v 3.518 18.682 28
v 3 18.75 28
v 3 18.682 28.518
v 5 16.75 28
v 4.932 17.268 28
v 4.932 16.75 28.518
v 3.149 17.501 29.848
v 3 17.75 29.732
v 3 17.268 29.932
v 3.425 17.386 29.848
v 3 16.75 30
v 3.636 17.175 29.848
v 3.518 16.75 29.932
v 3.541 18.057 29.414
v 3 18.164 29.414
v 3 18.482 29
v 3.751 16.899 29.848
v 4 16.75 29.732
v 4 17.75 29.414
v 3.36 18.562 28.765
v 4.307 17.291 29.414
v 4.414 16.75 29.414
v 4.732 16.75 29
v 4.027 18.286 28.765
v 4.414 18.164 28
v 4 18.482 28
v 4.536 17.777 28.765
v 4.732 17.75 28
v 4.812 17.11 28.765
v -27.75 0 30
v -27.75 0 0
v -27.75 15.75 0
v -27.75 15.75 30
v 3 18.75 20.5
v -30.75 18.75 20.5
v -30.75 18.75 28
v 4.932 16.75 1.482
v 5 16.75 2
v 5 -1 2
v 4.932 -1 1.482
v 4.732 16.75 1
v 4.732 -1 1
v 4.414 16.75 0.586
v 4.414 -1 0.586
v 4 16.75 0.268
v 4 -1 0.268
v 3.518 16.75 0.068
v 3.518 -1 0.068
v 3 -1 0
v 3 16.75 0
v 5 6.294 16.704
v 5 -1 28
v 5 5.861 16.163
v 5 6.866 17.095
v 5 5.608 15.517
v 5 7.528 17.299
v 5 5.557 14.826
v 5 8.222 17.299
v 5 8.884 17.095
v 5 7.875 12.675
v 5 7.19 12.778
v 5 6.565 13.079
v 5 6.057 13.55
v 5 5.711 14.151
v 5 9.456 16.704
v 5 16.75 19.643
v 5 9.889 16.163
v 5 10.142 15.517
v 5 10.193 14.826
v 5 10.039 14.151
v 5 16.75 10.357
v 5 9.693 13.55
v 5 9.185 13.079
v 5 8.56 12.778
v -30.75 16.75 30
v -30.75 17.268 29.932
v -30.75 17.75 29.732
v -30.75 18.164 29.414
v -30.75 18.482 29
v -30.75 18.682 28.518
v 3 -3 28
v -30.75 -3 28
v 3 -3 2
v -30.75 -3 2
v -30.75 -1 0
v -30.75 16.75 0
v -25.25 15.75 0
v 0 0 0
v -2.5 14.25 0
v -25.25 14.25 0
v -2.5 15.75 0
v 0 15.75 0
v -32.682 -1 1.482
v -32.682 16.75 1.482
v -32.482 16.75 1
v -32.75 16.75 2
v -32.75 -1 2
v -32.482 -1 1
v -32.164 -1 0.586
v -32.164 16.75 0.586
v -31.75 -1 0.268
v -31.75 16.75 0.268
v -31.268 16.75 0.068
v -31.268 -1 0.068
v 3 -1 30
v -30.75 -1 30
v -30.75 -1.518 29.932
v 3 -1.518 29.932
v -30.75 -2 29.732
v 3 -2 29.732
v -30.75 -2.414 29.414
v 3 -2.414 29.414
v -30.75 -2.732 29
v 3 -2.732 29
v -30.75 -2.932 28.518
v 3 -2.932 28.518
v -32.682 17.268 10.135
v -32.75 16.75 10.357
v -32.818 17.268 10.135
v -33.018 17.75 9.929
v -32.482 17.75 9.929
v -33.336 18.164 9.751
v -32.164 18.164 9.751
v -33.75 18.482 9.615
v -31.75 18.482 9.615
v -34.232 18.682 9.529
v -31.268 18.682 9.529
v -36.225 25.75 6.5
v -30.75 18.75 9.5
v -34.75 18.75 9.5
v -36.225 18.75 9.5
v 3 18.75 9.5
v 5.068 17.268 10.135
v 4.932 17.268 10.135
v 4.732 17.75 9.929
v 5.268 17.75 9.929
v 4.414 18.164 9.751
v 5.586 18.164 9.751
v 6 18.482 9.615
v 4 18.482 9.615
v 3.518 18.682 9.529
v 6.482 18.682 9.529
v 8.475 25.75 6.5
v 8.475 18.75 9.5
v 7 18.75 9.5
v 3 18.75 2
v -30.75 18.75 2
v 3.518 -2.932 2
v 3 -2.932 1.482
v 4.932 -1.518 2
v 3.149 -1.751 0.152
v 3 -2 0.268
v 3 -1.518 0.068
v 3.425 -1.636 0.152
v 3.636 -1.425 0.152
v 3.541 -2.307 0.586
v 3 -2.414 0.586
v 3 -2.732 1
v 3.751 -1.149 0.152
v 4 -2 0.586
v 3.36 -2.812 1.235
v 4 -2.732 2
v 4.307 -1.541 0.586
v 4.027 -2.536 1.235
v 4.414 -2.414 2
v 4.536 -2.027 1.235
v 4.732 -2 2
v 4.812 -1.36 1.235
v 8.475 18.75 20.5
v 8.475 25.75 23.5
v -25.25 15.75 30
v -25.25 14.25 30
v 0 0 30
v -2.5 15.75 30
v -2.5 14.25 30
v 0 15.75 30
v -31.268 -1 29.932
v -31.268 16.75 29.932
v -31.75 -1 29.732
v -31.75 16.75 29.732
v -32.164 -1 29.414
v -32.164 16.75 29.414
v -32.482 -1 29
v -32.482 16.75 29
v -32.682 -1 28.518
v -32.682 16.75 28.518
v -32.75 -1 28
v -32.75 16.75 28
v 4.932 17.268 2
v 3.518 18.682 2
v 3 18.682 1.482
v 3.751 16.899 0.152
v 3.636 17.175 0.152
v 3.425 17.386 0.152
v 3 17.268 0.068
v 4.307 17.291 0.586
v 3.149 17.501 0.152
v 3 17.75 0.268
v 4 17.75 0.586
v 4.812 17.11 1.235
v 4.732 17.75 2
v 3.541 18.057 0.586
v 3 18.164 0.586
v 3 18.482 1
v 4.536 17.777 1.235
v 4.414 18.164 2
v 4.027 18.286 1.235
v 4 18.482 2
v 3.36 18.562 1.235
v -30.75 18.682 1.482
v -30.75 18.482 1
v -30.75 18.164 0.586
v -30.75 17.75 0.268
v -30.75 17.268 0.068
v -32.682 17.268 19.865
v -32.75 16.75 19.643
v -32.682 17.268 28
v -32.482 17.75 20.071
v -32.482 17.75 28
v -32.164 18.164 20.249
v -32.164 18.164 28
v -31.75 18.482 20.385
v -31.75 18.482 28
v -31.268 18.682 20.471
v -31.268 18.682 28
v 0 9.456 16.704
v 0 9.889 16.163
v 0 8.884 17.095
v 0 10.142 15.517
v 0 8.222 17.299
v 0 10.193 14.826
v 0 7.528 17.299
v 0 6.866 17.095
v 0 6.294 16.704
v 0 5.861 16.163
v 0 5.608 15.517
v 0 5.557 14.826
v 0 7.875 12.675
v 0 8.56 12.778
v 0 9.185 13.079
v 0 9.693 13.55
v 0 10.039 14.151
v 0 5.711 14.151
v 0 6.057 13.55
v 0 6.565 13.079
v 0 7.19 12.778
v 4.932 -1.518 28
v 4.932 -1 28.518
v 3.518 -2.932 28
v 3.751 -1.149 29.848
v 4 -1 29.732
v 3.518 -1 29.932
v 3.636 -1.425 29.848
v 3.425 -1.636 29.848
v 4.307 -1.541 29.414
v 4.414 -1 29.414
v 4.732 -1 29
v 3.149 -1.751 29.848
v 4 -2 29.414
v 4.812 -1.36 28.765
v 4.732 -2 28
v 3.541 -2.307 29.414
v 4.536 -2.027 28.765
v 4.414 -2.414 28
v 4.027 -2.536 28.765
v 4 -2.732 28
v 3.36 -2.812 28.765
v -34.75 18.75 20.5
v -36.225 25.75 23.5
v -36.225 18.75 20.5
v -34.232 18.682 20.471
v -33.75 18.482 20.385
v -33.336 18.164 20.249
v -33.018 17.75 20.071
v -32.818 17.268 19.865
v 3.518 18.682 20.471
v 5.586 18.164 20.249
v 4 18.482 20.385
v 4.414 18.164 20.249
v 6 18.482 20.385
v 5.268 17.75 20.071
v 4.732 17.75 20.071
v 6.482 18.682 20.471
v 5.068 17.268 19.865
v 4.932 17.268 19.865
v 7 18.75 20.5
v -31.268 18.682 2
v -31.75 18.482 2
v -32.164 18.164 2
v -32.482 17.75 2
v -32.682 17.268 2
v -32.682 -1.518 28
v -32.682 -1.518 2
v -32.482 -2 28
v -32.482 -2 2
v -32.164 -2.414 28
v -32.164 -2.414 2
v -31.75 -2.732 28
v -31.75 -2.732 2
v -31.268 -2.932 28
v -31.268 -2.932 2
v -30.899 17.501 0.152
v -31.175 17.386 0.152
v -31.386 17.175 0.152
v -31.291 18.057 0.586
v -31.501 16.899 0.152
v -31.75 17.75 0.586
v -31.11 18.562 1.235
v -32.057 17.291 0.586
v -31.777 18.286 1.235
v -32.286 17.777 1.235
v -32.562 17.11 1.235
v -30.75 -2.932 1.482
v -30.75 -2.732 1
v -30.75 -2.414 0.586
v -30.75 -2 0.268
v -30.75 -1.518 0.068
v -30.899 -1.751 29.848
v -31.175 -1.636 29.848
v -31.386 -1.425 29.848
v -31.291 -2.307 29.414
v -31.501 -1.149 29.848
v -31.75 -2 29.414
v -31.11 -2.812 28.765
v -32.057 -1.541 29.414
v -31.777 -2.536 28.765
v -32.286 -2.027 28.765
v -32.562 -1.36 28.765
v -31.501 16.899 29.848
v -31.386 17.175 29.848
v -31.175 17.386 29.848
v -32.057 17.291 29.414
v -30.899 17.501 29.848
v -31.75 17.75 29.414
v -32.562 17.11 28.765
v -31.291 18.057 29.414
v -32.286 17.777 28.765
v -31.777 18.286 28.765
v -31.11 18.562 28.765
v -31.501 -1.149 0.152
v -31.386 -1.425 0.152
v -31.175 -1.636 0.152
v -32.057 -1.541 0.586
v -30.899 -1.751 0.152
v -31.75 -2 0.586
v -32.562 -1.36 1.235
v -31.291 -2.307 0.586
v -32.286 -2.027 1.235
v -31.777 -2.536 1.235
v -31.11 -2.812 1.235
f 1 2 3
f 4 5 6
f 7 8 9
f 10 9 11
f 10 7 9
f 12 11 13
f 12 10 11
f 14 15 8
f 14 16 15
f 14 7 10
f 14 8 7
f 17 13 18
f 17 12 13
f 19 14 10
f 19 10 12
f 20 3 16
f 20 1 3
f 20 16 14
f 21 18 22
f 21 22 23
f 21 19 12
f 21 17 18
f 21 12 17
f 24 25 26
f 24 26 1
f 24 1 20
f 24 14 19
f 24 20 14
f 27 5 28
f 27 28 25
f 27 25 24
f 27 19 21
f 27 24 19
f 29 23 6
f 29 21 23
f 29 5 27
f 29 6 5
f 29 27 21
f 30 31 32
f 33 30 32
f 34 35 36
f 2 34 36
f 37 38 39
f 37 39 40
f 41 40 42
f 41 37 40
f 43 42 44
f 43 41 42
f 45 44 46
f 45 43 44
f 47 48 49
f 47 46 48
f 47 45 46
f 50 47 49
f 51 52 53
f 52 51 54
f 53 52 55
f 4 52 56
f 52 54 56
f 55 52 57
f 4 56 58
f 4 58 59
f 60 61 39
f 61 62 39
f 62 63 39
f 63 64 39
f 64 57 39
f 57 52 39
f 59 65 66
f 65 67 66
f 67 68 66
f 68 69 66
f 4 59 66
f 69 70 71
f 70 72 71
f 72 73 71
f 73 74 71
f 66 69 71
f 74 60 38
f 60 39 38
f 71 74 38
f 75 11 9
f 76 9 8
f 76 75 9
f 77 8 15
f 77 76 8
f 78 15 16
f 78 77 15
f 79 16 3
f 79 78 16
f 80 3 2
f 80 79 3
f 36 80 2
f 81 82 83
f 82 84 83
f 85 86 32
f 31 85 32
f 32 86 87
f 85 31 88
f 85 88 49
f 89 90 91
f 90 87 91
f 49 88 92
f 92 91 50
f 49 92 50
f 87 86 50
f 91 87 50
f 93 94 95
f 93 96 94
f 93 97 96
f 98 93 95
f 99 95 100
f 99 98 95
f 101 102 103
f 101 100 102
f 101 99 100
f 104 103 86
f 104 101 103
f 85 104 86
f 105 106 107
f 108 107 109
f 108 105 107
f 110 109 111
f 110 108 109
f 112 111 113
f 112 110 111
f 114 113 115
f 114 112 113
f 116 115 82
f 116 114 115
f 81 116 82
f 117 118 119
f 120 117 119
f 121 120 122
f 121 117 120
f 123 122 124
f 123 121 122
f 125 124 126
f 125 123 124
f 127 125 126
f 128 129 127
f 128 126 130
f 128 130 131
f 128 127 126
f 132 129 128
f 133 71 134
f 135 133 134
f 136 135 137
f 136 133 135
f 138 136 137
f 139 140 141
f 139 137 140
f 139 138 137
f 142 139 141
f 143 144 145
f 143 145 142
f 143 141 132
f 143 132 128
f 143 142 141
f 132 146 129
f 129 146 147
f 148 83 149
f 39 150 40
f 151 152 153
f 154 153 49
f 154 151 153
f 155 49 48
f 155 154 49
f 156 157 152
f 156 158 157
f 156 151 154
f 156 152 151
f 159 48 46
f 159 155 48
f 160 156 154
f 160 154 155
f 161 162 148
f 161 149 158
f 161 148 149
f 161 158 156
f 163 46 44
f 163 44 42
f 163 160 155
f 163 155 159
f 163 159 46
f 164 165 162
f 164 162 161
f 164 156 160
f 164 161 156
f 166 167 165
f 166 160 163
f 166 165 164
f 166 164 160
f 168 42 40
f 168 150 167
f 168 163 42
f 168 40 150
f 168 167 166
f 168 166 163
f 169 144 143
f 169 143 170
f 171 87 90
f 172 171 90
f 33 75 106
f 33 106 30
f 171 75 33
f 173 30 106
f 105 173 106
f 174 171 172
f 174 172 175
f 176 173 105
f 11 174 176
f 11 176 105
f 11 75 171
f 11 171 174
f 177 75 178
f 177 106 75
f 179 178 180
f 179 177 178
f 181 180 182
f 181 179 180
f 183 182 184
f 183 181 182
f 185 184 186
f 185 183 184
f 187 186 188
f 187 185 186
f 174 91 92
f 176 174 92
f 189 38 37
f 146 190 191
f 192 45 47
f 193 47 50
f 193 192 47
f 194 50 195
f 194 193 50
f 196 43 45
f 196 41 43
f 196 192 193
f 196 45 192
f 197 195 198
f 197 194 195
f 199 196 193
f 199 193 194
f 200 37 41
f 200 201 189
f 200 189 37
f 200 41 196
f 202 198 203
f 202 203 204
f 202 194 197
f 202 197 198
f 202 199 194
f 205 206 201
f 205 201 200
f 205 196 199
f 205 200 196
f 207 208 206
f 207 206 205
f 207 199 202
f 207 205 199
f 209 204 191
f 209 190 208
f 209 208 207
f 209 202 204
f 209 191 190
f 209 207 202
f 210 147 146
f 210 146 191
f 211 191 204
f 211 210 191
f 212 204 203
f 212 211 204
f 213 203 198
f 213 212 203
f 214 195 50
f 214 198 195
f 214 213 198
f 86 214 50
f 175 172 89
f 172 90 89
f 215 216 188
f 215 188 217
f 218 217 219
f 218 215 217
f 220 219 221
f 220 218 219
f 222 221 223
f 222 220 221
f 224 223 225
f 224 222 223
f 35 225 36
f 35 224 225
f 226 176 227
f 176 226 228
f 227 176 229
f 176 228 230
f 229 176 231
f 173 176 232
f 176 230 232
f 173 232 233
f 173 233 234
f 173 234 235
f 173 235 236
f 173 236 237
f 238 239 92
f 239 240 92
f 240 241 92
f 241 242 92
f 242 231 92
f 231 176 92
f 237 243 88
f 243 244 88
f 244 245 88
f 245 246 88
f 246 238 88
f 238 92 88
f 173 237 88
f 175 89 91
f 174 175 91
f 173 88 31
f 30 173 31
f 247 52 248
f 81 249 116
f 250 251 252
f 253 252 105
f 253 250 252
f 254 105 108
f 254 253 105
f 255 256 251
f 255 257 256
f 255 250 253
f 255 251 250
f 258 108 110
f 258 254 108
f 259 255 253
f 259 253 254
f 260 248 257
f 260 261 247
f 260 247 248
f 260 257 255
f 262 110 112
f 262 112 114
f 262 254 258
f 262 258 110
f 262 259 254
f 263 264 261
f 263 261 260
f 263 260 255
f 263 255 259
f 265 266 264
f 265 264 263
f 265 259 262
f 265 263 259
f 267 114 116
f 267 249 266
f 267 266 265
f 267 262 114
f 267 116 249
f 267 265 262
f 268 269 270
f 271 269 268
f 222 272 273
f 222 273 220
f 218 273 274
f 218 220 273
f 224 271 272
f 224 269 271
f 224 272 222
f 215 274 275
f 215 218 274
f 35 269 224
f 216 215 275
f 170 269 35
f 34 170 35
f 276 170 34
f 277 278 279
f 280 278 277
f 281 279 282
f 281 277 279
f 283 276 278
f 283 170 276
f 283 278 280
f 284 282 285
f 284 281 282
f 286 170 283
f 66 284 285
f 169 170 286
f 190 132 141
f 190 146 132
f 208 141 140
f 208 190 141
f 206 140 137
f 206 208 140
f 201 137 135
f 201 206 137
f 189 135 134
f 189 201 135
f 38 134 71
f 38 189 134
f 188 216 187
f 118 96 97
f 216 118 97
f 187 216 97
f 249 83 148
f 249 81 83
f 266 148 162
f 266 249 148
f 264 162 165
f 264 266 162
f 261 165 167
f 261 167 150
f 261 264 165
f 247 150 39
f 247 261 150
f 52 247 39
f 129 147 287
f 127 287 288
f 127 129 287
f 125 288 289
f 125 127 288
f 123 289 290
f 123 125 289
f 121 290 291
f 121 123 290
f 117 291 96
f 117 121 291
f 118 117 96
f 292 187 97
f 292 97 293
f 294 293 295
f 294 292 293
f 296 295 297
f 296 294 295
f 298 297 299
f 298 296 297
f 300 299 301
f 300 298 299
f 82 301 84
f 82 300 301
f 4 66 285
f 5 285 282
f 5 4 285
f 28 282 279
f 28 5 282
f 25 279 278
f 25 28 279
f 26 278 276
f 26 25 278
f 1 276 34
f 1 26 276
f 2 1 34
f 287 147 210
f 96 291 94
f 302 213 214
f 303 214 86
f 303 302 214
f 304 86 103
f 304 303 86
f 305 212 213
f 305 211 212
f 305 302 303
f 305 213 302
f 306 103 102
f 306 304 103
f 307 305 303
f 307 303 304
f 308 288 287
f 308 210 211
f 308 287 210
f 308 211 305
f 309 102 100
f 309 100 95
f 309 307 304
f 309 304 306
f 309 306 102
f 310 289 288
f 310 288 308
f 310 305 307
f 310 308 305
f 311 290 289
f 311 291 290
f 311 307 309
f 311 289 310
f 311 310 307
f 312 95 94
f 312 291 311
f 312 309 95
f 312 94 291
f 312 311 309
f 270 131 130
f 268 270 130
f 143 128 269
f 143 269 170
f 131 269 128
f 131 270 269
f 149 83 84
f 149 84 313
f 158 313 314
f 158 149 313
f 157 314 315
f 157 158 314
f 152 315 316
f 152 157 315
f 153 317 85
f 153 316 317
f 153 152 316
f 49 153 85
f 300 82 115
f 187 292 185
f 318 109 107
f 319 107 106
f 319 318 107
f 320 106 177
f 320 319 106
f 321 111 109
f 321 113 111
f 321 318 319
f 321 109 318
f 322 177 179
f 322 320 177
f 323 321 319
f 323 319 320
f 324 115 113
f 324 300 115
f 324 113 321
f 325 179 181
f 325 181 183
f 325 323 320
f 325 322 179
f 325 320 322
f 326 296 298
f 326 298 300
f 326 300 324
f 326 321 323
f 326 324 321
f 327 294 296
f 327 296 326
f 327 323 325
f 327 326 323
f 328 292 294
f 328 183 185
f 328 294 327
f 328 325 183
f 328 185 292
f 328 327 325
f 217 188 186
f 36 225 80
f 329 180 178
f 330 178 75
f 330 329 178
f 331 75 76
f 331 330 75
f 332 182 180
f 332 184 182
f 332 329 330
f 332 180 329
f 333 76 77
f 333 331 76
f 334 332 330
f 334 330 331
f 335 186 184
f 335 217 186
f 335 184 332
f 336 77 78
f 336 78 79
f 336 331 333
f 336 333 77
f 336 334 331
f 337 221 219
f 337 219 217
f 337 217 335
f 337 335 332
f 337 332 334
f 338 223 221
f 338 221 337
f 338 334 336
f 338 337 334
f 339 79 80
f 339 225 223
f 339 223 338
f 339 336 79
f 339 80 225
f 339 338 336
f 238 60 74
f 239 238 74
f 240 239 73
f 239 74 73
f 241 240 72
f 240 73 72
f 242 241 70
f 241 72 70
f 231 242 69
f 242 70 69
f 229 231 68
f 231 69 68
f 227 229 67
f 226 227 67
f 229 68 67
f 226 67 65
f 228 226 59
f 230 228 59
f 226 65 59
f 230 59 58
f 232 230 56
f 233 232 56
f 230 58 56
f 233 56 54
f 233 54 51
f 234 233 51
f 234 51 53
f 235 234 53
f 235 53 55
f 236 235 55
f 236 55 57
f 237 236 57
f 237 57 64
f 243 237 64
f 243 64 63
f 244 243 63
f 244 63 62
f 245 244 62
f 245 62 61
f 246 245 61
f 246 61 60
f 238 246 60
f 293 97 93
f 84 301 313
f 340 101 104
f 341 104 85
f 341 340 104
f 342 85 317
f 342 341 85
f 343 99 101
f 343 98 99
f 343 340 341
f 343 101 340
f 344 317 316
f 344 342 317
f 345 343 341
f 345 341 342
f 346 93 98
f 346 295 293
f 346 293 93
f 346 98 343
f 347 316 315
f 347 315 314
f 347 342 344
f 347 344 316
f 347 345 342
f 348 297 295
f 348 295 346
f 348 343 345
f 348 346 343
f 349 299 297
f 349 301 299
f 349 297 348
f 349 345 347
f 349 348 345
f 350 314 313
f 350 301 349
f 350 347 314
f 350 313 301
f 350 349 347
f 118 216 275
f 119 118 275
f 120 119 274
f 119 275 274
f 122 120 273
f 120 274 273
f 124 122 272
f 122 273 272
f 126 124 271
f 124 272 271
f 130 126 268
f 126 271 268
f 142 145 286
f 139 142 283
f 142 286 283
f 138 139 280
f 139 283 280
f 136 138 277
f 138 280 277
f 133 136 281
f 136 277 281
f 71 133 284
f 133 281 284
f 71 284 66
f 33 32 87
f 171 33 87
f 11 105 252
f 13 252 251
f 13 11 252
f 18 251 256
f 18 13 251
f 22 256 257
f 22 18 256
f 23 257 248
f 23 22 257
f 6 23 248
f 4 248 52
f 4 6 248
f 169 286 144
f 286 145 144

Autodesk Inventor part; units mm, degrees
ref_plane "YZ Plane" through (0, 0, 0) normal (1, 0, 0) x (0, 1, 0)
ref_plane "XZ Plane" through (0, 0, 0) normal (0, 1, 0) x (-1, 0, 0)
ref_plane "XY Plane" through (0, 0, 0) normal (0, 0, 1) x (1, 0, 0)
sketch "Skizze1" plane through (0, 0, 0) normal (0, 0, 1) x (1, 0, 0)
  line L0 (0, 0) -> (-27.75, 0)
  line L1 (-27.75, 0) -> (-27.75, 15.75)
  line L2 (-27.75, 15.75) -> (-25.25, 15.75)
  line L3 (-25.25, 15.75) -> (-25.25, 14.25)
  line L4 (-25.25, 14.25) -> (-2.5, 14.25)
  line L5 (-2.5, 14.25) -> (-2.5, 15.75)
  line L6 (-2.5, 15.75) -> (0, 15.75)
  line L7 (0, 15.75) -> (0, 0)
  line L8 (-32.75, -3) -> (5, -3)
  line L9 (5, -3) -> (5, 18.75)
  line L10 (5, 18.75) -> (-32.75, 18.75)
  line L11 (-32.75, 18.75) -> (-32.75, -3)
  line L12 (-27.75, 7.3651) -> (-32.75, 7.3651)
  line L13 (0, 6.5814) -> (5, 6.5814)
  dimension "d0" = 27.75
  dimension "d1" = 2.5
  dimension "d2" = 1.5
  dimension "d3" = 2.5
  dimension "d4" = 37.75
  dimension "d5" = 3
  dimension "d6" = 3
  dimension "d7" = 15.75
extrude "Extrusion1" add sketch "Skizze1" along normal blind 30 contours L7 L13 L9 L8 L11 L12 L1 L0 | L7 L6 L5 L4 L3 L2 L1 L12 L11 L10 L9 L13
sketch "Skizze2" plane through (-32.75, 18.75, 0) normal (0, 1, 0) x (1, 0, 0)
  line L0 (-3.475, -6.5) -> (41.225, -6.5)
  line L1 (41.225, -6.5) -> (41.225, -23.5)
  line L2 (41.225, -23.5) -> (-3.475, -23.5)
  line L3 (-3.475, -23.5) -> (-3.475, -6.5)
  line L4 (37.75, -30) -> (0, -30) projected
  line L5 (0, -30) -> (37.75, -30)
  line L6 (0, 0) -> (37.75, 0)
  point P0 (32.75, 0)
  dimension "d10" = 17
  dimension "d14" = 44.7
extrude "Extrusion2" add sketch "Skizze2" along normal blind 7
sketch "Skizze3" plane through (8.475, 18.75, 23.5) normal (1, 0, 0) x (0, 0, -1)
  line L0 (17, 0) -> (0, 0) projected
  line L1 (0, 0) -> (3, 0)
  line L2 (0, 0) -> (-6.5, 0) projected
  line L3 (0, 0) -> (0, 7) projected
  line L4 (0, 0) -> (0, 7)
  line L5 (0, 7) -> (3, 0)
  line L6 (17, 0) -> (14, 0)
  line L7 (14, 0) -> (17, 7)
  line L8 (17, 0) -> (17, 7) projected
  line L9 (17, 7) -> (17, 0)
  point P0 (23.5, -18.75)
  dimension "d17" = 3
  dimension "d18" = 3
extrude "Extrusion3" cut sketch "Skizze3" against normal through all
sketch "Skizze4" plane through (5, -3, 0) normal (1, 0, 0) x (0, 0, -1)
  circle A0 centre (-15, 10.875) radius 2.325
  line L0 (-15, 10.875) -> (-30, 10.875)
  line L1 (-30, 0) -> (-30, 21.75) projected
  line L2 (-15, 10.875) -> (-15, 21.75)
  line L3 (-9.5, 21.75) -> (-20.5, 21.75) projected
  point P0 (0, 3)
  dimension "d21" = 4.65
  dimension "d22" = 90
  dimension "d23" = 90
extrude "Extrusion4" cut sketch "Skizze4" against normal blind 7
fillet "Rundung1" radius 2 6 edges at (-32.75, -3, 15) (5, -3, 15) (5, 18.75, 25.25) (5, 18.75, 4.75) (-32.75, 18.75, 4.75) (-32.75, 18.75, 25.25)
fillet "Rundung2" radius 2 2 edges at (5, 18.75, 15) (-32.75, 18.75, 15)
fillet "Rundung3" radius 2 16 edges at (-32.1642, -2.4142, 30) (-13.875, -3, 30) (4.4142, -2.4142, 30) (5, 7.875, 30) (4.4142, 18.1642, 30) (-13.875, 18.75, 30) (-32.1642, 18.1642, 30) (-32.75, 7.875, 30) (-32.1642, -2.4142, 0) (-13.875, -3, 0) (4.4142, -2.4142, 0) (5, 7.875, 0) (4.4142, 18.1642, 0) (-13.875, 18.75, 0) (-32.1642, 18.1642, 0) (-32.75, 7.875, 0)
properties part number "Schienenläufer_mit_keil_27.5_15.11"
